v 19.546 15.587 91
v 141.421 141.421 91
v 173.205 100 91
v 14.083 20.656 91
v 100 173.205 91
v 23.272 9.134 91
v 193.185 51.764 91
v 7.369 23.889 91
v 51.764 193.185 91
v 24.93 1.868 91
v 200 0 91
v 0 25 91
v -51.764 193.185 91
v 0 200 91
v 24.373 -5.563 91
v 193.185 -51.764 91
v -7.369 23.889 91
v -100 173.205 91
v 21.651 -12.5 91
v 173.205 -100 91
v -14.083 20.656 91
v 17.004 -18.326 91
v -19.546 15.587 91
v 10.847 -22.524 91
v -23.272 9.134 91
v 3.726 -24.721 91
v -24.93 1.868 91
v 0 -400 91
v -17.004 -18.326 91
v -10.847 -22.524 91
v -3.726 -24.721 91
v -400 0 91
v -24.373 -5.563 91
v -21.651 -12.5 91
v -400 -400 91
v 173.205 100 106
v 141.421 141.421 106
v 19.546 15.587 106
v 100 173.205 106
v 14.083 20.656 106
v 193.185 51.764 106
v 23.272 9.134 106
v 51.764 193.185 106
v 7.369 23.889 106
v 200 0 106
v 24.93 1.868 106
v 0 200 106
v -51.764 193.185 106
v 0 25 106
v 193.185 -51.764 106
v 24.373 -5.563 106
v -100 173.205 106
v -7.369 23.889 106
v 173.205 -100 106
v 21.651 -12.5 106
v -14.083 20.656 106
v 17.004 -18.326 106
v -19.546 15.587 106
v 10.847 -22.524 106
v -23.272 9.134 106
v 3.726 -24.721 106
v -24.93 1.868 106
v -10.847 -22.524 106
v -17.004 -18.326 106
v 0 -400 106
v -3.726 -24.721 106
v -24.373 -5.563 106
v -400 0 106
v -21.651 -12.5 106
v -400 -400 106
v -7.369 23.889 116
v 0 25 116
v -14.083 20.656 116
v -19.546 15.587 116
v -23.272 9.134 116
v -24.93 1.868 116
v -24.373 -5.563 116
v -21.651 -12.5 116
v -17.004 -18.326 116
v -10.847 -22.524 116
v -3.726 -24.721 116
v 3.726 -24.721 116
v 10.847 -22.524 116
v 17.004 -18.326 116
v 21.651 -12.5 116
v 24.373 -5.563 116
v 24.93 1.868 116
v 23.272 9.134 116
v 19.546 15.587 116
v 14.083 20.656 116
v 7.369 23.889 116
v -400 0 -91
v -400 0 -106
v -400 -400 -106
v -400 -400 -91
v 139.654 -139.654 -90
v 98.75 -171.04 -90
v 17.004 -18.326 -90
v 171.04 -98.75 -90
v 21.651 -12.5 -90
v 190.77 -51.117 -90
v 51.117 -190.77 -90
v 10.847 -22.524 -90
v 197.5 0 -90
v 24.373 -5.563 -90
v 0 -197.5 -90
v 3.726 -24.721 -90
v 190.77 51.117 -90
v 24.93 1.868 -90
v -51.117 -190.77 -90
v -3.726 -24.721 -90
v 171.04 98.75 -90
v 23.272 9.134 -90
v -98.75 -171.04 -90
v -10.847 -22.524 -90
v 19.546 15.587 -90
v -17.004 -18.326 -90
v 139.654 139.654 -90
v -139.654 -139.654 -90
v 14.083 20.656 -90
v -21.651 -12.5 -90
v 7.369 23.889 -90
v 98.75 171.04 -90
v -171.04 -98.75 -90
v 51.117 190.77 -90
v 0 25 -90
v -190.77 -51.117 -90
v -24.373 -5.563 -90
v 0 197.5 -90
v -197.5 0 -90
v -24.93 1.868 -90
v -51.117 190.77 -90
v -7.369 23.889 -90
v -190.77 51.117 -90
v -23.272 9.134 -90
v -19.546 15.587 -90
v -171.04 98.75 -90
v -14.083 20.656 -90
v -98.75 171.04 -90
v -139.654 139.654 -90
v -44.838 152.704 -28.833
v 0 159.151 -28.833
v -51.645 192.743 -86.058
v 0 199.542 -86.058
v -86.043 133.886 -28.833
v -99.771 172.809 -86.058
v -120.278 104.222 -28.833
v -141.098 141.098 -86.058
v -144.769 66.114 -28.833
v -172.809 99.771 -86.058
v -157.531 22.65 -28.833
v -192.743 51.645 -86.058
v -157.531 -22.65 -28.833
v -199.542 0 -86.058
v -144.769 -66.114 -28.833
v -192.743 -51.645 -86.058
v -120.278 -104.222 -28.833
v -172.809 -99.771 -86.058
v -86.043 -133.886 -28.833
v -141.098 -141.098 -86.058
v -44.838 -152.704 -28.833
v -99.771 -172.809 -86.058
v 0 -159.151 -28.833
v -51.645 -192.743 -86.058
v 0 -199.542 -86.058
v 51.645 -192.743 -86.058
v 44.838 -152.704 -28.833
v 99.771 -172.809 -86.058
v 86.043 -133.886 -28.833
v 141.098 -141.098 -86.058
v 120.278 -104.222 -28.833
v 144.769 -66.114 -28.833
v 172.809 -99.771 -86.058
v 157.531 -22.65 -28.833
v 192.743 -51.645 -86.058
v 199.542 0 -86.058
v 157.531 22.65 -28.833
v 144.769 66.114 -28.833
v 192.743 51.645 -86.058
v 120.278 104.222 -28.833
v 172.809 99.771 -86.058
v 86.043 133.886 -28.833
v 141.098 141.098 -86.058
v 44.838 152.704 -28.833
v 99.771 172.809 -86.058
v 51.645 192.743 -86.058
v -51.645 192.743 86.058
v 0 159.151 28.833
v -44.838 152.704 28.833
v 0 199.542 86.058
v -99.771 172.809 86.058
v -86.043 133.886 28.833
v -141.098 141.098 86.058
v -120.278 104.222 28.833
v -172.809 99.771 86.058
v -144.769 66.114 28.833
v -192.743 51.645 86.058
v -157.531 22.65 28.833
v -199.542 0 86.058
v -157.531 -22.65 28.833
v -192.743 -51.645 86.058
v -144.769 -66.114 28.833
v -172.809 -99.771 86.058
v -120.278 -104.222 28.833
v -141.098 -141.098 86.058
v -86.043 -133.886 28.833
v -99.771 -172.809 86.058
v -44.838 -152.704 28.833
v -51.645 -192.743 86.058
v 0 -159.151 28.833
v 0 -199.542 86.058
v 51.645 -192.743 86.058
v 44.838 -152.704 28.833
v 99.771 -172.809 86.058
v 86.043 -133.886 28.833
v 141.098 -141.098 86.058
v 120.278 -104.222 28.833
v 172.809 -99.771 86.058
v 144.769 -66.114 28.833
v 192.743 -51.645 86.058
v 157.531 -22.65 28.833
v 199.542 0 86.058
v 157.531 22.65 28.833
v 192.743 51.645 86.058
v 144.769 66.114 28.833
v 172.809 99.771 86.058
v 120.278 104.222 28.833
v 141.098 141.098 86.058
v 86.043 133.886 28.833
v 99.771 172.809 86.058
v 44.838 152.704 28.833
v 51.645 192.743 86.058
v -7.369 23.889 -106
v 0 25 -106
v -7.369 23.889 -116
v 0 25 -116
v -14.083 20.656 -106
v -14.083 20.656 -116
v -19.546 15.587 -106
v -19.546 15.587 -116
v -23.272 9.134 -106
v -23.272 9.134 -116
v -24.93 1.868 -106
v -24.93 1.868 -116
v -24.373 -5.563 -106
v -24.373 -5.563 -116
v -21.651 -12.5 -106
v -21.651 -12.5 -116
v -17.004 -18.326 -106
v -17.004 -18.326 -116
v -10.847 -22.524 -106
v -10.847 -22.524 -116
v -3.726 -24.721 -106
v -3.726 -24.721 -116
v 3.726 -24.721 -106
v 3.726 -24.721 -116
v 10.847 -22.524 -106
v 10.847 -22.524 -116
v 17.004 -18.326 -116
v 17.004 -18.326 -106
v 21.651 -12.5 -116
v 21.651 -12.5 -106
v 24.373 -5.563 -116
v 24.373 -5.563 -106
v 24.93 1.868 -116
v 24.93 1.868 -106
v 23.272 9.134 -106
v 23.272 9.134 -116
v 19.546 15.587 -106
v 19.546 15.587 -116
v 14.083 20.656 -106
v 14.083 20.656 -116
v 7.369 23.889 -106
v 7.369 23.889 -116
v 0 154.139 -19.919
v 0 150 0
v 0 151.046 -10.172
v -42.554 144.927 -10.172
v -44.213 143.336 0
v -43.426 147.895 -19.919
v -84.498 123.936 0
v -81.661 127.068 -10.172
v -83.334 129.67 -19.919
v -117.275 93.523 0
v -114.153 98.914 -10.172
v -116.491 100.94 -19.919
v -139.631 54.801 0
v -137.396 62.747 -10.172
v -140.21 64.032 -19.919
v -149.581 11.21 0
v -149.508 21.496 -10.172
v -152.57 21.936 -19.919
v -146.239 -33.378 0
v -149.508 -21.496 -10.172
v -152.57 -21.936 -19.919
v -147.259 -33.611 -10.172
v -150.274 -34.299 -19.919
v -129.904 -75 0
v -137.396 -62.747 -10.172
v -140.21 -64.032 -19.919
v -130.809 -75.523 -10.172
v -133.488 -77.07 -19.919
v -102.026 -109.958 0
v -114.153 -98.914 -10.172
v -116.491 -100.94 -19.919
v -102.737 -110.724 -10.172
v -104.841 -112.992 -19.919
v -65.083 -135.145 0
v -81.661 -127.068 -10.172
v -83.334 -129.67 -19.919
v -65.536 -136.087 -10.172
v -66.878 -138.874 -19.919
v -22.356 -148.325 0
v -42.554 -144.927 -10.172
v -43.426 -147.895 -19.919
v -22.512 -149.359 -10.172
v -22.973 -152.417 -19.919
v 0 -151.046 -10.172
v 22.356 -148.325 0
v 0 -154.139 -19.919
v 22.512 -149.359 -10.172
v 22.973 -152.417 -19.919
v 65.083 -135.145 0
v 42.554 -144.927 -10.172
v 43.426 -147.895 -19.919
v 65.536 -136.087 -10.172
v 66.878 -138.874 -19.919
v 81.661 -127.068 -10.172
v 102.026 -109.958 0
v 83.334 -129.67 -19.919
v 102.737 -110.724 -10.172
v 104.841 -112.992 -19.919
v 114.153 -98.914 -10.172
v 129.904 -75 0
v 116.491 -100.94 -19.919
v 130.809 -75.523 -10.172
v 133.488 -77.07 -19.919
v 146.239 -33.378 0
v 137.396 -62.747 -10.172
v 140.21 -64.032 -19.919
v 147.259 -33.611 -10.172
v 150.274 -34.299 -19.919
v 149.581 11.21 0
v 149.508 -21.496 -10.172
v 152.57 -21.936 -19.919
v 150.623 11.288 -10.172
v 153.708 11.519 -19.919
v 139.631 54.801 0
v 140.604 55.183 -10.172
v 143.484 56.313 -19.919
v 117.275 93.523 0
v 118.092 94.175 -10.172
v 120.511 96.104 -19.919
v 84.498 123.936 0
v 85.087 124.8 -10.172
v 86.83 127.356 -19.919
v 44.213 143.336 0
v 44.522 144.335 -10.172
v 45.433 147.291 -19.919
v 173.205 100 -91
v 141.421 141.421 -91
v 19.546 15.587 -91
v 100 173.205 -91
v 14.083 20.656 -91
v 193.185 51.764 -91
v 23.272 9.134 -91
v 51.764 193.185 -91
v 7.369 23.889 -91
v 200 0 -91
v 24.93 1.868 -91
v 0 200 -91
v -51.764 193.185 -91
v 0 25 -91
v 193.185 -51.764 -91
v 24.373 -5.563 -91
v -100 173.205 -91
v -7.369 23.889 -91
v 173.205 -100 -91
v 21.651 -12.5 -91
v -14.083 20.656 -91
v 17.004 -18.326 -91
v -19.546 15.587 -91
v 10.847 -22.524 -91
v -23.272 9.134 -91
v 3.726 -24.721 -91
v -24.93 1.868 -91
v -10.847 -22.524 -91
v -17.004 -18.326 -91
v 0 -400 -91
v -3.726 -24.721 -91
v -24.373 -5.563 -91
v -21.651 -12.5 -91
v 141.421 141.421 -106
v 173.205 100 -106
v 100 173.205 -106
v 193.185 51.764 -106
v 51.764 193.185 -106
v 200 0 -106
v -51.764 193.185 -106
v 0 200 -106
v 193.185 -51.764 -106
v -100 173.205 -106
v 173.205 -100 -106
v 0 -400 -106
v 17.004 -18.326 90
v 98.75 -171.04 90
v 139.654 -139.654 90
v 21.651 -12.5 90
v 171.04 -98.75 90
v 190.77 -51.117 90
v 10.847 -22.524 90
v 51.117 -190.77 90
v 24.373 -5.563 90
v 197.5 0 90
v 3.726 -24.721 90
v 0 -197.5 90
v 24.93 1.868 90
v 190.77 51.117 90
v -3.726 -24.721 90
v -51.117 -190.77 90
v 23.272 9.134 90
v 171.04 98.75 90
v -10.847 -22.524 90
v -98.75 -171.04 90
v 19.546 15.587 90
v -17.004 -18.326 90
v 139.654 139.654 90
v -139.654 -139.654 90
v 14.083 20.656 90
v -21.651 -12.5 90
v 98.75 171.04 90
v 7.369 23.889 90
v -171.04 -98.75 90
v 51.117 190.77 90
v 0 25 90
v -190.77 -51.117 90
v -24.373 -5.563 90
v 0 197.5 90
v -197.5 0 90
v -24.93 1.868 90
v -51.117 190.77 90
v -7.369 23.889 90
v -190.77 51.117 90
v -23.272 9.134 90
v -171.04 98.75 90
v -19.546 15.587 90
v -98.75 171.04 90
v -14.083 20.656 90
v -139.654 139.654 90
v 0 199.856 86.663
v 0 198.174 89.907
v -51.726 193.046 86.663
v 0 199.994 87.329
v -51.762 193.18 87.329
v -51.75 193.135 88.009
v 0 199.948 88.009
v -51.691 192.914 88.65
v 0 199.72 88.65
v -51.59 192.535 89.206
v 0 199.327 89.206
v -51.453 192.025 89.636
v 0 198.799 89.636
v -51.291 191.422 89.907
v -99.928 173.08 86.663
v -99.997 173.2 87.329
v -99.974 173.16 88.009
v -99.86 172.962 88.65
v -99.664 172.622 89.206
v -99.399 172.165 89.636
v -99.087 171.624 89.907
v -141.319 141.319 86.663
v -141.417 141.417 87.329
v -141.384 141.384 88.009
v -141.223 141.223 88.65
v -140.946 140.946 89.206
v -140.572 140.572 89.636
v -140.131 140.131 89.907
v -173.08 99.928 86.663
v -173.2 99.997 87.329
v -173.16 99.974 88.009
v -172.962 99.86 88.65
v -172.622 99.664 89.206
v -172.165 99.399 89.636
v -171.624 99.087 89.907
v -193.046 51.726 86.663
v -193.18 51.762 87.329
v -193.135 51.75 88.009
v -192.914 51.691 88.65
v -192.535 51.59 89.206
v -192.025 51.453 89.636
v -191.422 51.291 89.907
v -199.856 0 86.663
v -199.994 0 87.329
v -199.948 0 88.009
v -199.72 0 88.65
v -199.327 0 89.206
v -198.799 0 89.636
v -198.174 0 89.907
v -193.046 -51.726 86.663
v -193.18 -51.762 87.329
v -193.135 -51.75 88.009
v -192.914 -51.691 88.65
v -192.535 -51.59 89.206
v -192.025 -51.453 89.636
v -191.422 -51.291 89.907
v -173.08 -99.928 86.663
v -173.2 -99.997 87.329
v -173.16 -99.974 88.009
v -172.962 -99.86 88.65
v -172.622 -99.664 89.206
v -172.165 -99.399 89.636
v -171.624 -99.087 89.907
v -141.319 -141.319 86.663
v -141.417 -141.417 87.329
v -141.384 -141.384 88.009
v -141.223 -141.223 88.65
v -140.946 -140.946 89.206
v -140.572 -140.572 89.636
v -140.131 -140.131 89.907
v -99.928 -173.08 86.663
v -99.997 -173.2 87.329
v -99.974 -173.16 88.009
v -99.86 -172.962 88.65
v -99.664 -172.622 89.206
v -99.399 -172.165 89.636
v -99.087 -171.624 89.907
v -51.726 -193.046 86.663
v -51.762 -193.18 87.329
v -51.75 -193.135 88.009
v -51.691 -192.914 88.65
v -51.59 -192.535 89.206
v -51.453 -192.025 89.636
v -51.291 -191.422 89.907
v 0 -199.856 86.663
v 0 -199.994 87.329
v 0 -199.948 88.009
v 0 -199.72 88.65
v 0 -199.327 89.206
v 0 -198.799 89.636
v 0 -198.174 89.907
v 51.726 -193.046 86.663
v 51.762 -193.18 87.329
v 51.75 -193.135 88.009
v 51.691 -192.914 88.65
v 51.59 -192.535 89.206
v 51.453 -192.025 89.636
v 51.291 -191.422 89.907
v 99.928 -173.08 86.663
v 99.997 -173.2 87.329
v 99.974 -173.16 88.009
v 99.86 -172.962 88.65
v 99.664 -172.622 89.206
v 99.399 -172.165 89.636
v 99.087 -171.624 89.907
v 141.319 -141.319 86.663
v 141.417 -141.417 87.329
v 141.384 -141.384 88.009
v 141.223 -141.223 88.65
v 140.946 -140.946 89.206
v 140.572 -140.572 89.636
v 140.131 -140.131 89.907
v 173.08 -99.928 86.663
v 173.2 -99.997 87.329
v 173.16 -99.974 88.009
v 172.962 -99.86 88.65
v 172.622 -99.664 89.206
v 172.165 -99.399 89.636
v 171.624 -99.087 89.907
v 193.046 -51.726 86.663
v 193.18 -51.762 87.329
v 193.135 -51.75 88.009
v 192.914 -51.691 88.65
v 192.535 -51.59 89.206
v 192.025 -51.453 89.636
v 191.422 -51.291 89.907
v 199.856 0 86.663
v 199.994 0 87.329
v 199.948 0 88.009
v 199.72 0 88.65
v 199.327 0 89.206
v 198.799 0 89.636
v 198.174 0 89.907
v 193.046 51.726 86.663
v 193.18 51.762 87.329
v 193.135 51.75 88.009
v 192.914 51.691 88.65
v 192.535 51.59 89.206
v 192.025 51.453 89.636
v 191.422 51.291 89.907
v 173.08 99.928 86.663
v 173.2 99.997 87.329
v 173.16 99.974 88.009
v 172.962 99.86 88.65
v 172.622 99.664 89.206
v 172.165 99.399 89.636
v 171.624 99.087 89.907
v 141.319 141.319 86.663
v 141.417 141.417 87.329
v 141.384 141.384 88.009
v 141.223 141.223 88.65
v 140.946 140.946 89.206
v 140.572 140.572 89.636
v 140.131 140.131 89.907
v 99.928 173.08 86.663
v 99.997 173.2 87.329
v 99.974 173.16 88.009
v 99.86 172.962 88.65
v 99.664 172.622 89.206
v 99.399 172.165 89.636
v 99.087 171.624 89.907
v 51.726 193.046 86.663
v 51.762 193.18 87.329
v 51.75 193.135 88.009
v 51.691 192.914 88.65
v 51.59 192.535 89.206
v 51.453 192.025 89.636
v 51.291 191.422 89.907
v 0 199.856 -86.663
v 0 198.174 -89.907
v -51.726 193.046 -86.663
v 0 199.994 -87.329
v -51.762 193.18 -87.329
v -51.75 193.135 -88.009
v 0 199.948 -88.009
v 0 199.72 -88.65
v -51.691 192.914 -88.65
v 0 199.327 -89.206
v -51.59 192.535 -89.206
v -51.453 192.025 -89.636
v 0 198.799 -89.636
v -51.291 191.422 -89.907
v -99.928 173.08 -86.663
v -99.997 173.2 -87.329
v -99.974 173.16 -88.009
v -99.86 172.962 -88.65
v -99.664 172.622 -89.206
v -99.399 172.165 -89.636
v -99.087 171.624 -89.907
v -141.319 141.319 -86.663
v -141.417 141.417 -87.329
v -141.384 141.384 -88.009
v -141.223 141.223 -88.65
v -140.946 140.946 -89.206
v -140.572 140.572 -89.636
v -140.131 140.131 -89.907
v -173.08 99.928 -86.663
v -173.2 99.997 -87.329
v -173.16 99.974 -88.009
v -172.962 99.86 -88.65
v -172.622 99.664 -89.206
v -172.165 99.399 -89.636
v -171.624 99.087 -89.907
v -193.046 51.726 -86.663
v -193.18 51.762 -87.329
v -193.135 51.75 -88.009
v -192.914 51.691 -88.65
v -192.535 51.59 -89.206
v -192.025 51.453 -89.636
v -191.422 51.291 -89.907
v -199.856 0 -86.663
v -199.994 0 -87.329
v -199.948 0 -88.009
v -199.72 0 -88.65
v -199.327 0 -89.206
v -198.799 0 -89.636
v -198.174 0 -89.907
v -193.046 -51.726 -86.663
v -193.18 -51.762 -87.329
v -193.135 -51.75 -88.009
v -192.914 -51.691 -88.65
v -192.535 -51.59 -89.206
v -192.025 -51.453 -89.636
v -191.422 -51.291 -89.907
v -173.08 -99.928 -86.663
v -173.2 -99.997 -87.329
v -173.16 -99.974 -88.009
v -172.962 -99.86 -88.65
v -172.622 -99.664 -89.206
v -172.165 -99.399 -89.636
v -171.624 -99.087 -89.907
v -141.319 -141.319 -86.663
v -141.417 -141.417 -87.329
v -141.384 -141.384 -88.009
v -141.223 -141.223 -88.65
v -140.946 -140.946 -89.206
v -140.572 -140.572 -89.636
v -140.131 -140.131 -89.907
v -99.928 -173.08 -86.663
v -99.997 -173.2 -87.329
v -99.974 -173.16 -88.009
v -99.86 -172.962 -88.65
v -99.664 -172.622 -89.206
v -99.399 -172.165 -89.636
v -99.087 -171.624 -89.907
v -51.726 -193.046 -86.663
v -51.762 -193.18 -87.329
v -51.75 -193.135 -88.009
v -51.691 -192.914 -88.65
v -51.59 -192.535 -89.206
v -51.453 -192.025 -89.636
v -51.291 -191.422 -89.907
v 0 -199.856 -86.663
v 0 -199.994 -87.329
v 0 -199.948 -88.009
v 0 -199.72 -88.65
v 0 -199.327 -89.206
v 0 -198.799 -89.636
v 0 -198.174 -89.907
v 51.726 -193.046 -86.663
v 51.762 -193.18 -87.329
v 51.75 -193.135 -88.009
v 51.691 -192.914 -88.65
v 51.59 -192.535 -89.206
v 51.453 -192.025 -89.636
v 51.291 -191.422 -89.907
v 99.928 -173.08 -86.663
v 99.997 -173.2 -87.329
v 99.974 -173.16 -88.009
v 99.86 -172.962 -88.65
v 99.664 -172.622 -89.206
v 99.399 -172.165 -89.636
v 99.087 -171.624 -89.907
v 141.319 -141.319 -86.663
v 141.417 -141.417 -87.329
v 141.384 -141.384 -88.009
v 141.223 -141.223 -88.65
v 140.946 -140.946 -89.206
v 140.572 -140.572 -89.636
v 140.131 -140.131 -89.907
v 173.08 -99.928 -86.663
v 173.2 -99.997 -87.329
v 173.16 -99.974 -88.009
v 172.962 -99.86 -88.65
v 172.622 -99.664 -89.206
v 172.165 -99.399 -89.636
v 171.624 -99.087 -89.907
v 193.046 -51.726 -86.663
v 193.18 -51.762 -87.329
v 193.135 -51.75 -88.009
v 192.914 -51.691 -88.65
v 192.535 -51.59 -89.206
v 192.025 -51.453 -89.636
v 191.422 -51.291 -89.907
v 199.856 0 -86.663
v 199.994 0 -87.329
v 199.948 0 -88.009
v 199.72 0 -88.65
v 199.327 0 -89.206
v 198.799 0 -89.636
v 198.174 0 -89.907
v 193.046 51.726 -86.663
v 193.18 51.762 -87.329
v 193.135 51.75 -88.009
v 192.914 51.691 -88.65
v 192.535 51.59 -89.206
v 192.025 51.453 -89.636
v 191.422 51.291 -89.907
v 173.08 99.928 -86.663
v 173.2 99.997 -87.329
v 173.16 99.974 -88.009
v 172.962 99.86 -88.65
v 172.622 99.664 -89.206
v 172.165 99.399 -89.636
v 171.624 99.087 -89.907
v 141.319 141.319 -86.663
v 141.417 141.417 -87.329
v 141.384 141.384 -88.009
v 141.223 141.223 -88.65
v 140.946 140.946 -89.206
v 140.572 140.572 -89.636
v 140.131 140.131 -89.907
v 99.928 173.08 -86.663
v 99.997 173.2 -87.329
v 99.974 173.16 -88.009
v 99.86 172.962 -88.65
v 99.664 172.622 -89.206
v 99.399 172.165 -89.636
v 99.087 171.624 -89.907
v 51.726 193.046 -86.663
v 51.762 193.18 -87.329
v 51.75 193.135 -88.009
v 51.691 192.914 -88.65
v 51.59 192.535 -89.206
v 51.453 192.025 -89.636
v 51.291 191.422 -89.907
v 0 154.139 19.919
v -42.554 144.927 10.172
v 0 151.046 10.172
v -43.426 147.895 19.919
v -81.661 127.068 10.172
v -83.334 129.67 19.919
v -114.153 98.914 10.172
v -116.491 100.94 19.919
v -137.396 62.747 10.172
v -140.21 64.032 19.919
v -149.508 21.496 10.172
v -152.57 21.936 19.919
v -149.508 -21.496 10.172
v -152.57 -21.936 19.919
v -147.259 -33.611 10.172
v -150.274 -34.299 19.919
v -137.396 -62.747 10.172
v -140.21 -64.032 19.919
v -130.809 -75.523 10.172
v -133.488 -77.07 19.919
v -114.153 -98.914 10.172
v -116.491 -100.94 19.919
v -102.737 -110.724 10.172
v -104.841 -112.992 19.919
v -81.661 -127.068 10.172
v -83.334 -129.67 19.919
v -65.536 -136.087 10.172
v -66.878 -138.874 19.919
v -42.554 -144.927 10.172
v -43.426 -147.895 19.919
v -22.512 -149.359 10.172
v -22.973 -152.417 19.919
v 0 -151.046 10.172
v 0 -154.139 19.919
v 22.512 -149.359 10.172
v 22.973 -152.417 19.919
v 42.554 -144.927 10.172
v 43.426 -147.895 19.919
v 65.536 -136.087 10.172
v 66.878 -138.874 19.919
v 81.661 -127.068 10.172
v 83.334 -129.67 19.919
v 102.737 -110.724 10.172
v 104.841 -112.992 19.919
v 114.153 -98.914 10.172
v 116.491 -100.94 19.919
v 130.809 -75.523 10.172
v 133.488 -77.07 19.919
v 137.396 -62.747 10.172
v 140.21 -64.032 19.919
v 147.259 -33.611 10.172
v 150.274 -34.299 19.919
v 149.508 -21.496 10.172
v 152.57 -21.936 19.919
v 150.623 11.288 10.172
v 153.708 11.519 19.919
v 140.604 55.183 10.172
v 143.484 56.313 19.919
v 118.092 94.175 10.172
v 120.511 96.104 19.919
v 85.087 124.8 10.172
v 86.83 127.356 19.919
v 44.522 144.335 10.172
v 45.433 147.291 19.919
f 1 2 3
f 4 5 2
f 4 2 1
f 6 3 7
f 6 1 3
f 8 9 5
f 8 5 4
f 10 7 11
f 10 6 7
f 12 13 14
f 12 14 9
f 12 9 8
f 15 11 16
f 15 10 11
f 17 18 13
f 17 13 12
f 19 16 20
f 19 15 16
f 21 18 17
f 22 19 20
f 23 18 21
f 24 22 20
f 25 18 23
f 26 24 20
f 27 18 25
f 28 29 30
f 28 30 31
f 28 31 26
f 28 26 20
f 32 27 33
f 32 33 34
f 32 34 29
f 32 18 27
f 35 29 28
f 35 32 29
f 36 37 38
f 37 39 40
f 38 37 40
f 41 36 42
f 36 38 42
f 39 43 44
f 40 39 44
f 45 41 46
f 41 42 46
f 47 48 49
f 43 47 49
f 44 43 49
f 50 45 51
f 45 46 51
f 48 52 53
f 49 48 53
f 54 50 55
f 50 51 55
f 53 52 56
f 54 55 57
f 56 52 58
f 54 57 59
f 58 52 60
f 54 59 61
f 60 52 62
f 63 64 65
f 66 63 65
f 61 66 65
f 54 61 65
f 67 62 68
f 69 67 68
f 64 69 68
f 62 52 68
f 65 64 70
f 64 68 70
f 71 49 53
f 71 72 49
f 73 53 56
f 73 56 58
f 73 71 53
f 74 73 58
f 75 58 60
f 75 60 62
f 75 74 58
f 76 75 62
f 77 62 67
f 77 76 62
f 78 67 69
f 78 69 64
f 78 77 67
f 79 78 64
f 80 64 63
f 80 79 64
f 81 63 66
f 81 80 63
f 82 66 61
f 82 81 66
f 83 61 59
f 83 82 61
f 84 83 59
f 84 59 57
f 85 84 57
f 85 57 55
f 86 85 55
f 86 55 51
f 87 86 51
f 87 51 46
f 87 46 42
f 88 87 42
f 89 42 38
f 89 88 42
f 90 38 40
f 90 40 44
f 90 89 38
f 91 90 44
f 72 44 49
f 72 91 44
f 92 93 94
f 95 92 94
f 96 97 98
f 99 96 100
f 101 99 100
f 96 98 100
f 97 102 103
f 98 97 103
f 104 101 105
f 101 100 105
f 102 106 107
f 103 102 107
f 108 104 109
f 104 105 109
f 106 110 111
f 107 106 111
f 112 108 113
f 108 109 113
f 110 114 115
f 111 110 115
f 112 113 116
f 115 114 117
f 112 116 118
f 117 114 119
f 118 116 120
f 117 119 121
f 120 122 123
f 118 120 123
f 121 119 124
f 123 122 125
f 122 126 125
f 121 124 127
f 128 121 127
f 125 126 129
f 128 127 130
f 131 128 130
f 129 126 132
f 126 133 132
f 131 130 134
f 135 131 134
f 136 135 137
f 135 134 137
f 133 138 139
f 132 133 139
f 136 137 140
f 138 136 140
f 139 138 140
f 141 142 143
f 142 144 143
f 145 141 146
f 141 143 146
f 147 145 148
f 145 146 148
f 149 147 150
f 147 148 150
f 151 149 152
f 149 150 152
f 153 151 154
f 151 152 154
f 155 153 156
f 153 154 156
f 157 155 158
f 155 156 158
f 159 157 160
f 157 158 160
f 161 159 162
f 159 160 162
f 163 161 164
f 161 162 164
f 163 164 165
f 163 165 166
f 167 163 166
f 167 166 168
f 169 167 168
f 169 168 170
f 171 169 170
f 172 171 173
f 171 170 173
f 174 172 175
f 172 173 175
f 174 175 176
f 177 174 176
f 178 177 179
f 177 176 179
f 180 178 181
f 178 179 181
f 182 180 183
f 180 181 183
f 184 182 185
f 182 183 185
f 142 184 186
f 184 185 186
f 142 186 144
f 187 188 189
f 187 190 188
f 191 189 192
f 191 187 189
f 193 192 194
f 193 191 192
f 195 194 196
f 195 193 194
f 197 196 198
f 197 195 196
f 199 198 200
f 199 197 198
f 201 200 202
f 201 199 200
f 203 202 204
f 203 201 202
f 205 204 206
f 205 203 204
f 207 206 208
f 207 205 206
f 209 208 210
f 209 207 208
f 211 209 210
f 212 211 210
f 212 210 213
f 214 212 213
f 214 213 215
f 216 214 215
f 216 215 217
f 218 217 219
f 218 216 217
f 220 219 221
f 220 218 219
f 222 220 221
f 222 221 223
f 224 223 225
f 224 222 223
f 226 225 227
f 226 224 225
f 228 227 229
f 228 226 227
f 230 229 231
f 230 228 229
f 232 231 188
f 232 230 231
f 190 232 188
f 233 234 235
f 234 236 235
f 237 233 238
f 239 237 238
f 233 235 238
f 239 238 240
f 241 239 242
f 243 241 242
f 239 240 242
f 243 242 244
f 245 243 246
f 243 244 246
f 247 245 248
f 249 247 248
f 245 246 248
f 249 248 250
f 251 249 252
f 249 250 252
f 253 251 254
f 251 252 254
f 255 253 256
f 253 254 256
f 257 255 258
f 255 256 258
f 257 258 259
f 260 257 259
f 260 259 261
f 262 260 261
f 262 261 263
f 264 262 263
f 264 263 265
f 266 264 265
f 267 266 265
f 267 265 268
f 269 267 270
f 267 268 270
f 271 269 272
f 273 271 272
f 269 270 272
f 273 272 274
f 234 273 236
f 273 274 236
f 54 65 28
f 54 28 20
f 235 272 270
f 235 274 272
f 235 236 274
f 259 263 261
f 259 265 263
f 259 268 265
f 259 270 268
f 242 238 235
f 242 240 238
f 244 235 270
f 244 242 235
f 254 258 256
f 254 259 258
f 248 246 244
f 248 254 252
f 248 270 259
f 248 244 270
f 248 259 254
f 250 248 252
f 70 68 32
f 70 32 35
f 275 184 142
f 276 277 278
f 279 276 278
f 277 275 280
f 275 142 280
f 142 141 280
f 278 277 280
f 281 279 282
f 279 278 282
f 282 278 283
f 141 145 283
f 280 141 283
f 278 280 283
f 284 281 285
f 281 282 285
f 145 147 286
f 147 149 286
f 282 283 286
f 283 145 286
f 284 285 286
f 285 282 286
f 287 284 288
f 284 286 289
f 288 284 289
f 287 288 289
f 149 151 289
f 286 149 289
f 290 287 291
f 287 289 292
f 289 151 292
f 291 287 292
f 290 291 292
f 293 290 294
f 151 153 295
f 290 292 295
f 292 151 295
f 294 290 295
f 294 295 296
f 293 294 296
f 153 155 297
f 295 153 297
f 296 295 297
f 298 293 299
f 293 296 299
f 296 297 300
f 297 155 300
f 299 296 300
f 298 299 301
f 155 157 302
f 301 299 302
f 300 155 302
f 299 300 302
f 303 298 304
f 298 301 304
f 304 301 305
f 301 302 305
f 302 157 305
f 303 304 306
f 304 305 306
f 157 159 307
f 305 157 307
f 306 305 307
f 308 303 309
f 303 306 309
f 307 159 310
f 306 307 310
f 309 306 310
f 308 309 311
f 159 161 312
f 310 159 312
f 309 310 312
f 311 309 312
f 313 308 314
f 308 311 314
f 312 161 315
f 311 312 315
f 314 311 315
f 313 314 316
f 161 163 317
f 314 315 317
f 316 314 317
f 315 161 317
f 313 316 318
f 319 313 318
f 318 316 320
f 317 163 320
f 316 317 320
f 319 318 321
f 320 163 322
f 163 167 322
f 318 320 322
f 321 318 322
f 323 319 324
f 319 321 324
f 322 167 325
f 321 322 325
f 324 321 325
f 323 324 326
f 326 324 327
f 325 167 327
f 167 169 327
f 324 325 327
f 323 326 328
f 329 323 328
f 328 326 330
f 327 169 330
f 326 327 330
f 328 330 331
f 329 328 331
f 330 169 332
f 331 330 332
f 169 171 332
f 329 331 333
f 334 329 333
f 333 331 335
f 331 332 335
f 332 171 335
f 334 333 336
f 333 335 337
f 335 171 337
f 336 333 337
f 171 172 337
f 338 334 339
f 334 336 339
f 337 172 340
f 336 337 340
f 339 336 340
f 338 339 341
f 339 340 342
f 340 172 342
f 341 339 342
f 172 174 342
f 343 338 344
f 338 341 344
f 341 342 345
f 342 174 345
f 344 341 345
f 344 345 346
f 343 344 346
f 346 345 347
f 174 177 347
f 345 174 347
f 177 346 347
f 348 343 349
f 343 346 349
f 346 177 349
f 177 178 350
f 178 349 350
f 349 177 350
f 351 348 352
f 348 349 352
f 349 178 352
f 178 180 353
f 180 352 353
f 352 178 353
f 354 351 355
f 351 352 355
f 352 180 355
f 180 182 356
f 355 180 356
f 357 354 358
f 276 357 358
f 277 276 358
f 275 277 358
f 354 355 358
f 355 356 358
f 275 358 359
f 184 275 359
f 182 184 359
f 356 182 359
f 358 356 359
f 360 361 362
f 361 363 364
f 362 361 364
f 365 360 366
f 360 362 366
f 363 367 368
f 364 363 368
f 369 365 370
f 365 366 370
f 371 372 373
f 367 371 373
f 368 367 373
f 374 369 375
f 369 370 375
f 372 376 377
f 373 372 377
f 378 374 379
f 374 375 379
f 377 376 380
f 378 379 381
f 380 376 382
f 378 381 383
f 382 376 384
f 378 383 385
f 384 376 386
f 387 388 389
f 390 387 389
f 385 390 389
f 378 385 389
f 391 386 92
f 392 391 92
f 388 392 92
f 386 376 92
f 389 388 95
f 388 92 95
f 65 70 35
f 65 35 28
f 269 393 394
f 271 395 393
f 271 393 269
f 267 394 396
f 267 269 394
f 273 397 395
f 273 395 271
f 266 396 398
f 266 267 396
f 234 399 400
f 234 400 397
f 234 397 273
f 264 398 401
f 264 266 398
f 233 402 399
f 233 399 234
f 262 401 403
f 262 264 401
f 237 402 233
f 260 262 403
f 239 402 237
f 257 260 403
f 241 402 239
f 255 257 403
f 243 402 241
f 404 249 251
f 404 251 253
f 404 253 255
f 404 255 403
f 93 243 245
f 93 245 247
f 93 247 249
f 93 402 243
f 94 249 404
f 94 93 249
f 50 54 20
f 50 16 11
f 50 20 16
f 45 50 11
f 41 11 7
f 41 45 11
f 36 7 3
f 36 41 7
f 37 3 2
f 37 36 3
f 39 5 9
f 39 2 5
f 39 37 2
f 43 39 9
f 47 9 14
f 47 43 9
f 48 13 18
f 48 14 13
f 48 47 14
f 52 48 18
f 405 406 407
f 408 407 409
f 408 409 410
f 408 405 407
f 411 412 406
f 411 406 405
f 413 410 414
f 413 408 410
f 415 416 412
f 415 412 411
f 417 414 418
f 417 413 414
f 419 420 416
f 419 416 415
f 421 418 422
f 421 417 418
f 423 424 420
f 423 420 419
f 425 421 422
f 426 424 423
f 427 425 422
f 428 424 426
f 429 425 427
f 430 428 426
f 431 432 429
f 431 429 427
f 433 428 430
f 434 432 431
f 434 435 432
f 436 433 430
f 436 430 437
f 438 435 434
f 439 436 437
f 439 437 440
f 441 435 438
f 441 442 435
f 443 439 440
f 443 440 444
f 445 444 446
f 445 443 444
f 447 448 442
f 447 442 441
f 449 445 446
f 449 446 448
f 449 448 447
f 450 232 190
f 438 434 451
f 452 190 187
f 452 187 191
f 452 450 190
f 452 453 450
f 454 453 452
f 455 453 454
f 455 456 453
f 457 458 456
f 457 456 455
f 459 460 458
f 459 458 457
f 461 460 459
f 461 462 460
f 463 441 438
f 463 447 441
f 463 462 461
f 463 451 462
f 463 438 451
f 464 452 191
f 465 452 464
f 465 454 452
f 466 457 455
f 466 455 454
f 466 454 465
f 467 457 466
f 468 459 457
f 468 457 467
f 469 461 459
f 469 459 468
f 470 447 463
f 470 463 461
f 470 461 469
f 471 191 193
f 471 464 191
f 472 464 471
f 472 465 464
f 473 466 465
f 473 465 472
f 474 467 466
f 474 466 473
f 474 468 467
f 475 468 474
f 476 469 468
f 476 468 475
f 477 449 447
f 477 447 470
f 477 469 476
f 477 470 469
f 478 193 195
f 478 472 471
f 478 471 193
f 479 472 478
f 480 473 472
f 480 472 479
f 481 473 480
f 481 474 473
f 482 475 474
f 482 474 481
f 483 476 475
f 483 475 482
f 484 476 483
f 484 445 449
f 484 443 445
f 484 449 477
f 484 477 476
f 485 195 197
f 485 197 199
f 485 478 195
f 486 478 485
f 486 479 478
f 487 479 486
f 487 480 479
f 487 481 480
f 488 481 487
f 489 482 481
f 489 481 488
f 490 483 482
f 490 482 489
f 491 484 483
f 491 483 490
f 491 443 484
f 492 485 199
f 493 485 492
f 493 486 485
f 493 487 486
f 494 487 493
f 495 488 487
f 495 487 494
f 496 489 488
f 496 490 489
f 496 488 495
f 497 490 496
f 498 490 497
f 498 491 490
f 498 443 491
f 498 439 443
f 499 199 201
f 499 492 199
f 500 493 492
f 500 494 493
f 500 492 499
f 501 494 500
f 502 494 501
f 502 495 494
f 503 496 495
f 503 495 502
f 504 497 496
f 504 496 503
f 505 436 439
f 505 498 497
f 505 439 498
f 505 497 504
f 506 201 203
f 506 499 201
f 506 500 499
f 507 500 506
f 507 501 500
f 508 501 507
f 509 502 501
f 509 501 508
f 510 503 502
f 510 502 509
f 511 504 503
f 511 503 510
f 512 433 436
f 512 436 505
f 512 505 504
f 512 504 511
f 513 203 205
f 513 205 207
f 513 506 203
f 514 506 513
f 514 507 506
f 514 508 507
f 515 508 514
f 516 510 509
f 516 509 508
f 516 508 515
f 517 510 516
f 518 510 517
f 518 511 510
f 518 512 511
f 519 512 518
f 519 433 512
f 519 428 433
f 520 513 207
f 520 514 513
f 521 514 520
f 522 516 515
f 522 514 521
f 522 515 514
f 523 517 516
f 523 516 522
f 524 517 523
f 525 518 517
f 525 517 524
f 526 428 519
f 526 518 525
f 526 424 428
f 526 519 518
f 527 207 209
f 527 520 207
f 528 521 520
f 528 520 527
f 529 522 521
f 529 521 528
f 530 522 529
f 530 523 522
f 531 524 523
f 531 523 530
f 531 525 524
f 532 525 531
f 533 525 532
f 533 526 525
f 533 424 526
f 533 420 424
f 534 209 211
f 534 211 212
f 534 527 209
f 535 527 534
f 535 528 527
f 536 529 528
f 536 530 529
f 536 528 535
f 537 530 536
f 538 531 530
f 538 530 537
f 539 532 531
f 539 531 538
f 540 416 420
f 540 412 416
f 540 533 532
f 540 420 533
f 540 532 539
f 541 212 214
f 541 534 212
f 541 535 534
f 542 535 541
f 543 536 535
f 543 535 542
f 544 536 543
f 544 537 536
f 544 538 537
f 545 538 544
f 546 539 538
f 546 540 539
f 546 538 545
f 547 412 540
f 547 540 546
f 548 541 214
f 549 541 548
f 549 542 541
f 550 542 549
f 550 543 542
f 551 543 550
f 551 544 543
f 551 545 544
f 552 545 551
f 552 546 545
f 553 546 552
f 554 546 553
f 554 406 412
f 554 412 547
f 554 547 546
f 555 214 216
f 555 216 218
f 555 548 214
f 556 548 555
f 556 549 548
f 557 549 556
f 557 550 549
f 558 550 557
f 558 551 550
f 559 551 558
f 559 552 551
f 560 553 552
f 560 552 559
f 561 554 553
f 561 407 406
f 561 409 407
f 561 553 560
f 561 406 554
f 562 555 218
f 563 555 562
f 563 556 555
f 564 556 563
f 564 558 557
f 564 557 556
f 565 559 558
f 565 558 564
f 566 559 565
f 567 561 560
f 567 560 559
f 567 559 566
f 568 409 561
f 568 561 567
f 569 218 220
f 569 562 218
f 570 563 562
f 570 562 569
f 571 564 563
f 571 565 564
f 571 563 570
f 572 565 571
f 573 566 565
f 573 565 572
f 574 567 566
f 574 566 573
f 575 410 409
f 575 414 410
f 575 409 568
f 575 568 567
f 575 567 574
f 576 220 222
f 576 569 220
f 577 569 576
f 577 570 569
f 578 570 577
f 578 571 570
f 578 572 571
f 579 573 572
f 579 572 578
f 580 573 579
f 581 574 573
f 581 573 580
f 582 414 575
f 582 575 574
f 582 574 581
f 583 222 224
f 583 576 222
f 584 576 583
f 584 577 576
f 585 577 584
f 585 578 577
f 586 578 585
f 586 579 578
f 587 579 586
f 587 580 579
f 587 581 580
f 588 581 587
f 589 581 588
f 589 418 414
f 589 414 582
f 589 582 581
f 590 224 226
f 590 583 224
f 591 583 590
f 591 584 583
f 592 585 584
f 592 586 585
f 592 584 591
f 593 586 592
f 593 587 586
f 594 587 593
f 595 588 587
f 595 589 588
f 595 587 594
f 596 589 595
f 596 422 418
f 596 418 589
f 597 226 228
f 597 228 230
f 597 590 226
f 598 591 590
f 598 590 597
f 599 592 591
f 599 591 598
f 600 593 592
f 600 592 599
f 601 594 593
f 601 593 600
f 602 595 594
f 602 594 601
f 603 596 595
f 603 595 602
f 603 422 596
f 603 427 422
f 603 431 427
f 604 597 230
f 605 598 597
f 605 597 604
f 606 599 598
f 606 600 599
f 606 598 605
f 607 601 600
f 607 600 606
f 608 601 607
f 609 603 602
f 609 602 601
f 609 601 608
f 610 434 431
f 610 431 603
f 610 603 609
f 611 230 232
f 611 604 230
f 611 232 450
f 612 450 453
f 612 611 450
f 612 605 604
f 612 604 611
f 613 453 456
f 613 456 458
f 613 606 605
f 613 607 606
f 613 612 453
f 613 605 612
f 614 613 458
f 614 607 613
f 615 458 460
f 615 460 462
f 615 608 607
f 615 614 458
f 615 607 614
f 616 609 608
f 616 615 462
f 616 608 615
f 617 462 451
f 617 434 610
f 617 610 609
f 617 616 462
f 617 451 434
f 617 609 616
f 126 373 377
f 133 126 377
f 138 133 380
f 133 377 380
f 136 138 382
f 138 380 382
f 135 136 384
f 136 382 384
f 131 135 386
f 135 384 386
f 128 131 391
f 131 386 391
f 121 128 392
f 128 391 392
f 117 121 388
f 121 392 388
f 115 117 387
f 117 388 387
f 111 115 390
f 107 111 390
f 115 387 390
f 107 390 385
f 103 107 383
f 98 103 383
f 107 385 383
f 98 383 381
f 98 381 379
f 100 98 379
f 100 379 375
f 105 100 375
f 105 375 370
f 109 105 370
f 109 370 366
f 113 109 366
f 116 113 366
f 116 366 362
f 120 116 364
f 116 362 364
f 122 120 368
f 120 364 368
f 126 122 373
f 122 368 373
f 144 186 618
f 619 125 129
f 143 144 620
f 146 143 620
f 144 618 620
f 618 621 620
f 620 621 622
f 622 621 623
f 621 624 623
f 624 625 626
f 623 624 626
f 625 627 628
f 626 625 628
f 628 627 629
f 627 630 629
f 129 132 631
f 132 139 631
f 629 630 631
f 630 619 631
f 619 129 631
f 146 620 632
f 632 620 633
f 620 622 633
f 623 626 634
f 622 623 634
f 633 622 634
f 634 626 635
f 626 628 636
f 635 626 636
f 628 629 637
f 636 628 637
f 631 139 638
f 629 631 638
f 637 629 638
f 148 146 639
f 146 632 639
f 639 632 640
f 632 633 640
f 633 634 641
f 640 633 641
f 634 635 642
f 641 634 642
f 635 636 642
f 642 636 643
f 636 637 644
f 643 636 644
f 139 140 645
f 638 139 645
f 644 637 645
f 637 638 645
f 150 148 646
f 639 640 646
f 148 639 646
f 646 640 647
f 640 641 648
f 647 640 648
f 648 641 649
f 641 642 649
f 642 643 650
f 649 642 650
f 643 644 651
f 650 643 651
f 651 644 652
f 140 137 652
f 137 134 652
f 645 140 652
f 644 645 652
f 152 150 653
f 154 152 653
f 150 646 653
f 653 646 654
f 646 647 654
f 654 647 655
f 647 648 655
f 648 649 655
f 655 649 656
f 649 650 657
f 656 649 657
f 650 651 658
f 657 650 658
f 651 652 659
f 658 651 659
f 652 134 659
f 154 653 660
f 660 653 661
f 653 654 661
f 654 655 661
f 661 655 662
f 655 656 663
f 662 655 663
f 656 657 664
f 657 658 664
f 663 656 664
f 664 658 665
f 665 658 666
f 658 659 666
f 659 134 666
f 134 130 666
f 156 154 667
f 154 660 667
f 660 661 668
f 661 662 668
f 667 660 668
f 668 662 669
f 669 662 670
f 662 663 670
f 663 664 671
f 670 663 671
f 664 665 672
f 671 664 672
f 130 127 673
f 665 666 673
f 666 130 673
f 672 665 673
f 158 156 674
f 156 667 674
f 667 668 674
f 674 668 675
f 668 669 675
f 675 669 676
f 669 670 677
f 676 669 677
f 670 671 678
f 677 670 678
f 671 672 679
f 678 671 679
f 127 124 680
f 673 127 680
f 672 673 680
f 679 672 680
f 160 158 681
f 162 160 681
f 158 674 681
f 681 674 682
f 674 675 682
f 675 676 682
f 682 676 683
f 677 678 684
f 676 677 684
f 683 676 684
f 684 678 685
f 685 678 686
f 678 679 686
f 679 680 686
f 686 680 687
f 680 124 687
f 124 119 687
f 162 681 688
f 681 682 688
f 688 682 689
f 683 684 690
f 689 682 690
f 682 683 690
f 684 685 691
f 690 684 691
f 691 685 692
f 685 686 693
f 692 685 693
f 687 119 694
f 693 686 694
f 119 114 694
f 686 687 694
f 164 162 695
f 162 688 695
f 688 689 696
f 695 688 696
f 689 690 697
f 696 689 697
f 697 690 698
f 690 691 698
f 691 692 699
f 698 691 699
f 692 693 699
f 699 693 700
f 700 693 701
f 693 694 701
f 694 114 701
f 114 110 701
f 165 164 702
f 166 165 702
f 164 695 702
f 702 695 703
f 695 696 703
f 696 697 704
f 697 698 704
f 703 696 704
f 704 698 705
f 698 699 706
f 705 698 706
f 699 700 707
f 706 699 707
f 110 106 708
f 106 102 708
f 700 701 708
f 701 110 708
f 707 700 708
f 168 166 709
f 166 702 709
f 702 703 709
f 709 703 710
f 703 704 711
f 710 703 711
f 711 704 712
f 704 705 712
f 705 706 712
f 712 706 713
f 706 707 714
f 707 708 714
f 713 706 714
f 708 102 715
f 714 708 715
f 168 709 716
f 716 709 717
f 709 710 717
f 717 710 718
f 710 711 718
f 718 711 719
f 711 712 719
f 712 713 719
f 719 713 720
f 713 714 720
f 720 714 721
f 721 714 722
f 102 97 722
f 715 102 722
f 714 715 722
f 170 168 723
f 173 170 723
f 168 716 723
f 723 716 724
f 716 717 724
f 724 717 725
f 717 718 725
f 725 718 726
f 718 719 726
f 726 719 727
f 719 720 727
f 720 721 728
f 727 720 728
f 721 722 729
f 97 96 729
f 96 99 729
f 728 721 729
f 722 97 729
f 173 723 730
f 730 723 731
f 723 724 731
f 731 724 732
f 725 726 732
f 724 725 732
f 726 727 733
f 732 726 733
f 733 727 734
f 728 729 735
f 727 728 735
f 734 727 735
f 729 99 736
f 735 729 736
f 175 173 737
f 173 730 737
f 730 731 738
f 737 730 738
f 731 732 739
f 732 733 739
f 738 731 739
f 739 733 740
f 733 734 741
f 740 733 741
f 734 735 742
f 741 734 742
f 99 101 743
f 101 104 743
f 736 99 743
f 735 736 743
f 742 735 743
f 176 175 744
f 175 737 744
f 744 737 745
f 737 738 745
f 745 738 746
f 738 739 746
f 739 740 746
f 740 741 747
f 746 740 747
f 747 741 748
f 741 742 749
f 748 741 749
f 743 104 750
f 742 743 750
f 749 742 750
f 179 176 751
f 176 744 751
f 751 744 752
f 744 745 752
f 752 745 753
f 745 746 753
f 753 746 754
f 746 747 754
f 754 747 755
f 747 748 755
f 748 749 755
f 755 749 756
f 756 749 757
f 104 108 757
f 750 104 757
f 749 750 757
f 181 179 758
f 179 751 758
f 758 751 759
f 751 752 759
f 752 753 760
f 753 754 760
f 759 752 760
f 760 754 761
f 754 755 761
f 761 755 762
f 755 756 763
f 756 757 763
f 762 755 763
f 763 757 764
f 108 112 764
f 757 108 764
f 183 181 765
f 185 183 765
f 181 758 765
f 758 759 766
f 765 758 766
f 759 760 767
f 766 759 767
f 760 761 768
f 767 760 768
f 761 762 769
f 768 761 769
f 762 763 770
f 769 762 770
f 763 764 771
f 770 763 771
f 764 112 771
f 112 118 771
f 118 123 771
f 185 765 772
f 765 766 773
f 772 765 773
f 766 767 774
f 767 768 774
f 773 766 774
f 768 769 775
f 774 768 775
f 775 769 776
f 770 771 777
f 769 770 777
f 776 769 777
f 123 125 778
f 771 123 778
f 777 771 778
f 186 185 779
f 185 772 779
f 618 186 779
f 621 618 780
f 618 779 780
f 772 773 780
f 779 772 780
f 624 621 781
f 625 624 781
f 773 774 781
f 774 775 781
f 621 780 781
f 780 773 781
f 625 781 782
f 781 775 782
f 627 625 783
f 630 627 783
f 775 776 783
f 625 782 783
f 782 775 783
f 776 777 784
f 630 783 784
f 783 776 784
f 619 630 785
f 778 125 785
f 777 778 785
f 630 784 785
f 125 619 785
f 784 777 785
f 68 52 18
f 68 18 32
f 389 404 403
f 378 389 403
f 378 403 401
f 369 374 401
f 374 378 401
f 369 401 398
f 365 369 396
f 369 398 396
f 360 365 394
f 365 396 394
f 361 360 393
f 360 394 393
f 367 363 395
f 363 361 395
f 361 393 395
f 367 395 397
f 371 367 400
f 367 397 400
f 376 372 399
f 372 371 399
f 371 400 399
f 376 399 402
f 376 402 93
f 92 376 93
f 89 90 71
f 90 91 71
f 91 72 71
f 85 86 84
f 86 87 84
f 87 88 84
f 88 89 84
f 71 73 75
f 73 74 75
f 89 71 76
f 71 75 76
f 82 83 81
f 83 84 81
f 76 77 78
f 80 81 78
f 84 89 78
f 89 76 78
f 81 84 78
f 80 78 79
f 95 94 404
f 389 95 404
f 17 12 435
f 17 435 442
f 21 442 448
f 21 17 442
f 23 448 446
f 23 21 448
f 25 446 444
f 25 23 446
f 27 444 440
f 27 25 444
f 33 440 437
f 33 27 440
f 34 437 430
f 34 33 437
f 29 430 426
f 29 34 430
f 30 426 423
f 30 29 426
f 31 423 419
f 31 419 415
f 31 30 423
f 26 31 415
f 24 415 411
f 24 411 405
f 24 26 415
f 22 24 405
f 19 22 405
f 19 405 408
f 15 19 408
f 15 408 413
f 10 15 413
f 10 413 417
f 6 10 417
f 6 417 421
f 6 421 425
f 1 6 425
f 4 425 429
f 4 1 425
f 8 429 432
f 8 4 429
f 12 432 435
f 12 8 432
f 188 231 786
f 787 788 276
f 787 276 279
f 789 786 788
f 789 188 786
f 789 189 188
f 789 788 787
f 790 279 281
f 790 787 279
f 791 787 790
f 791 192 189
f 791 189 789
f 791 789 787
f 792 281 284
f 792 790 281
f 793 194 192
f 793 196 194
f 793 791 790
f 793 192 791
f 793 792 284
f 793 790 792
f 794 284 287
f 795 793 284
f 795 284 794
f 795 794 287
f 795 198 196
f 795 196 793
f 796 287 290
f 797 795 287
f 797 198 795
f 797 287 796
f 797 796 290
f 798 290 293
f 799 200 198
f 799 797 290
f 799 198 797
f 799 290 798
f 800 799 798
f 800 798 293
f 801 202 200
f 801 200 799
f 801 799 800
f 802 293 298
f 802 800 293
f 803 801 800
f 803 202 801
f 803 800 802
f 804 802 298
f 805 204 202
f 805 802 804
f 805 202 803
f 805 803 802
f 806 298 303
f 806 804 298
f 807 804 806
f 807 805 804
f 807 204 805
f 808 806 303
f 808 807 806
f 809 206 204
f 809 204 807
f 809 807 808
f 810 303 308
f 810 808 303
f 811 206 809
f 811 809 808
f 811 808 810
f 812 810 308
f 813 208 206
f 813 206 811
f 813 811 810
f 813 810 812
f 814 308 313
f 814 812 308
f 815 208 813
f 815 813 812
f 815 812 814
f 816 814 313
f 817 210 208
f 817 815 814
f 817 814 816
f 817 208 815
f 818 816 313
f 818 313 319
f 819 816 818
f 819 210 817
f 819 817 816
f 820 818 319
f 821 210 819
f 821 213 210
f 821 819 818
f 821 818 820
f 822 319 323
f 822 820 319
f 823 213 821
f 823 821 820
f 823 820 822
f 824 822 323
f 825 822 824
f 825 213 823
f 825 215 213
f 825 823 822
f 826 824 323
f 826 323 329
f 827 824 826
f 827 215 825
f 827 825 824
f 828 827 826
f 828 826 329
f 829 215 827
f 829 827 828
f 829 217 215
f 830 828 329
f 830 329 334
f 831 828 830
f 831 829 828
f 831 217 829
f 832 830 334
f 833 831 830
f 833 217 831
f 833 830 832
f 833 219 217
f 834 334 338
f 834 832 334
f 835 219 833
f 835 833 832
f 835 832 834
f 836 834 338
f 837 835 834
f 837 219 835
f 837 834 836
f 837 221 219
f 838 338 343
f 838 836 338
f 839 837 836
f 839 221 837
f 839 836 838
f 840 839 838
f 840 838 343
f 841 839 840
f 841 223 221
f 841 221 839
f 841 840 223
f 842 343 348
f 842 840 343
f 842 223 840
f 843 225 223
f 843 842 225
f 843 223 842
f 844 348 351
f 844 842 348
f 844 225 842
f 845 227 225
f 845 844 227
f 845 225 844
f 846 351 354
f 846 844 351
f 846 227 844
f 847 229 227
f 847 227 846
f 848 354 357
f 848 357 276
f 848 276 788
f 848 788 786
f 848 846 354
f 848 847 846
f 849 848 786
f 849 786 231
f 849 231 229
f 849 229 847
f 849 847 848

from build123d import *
from build123d import SkipClean  # not in build123d's __all__

# Parameters (mm, degrees)
F0_W     = 25
F0_H     = 10
F0_H_2   = 15
F0_W_2   = 175
F5_DEPTH = 15


# Not quite as in the source:
# - ends of sketch curves that miss each other by under 0.0002 mm in the source are joined


with BuildPart() as f1:
    # F0 (on Right) → F1 (revolve)
    with BuildSketch(Plane.YZ):
        with Locations((12.5, 111)):
            Rectangle(F0_W, F0_H)
        with Locations((12.5, 98.5)):
            Rectangle(F0_W, F0_H_2)
        Polygon((0, 0), (25, 0), (25, 90), (25, 91), (0, 91), align=None)
    revolve(axis=Axis((0, 0, 58), (0, 0, 1)))

    # F0 (on Right) → F2 (revolve)
    with BuildSketch(Plane.YZ):
        with BuildLine():
            ThreePointArc((150, 0), (152.3425507406, 15.1250629778), (159.1507012033, 28.8328768565))
            Line((159.1507012033, 28.8328768565), (199.542465, 86.058356))
            ThreePointArc((199.542465, 86.058356), (199.7196970287, 88.6501935058), (197.5, 90))
            Line((197.5, 90), (25, 90))
            Line((25, 90), (25, 0))
            Line((25, 0), (150, 0))
        make_face()
    revolve(axis=Axis((0, 0, 58), (0, 0, 1)))

    # F0 (on Right) → F3 (revolve)
    with BuildSketch(Plane.YZ):
        with Locations((112.5, 98.5)):
            Rectangle(F0_W_2, F0_H_2)
    revolve(axis=Axis((0, 0, 58), (0, 0, 1)))

    # F4 (on face) → F5 (join, through all)
    with BuildSketch(Plane.XY.offset(106)):
        with BuildLine():
            ThreePointArc((0, -200), (-141.4213562373, -141.4213562373), (-200, 0))
            Line((-200, 0), (-400, 0))
            Line((-400, 0), (-400, -400))
            Line((-400, -400), (0, -400))
            Line((0, -400), (0, -200))
        make_face()
        with BuildLine():
            Line((-400, 0), (-200, 0))
            ThreePointArc((-200, 0), (-173.2050807569, 100), (-100, 173.2050807569))
            Line((-100, 173.2050807569), (-400, 0))
        make_face()
        with BuildLine():
            ThreePointArc((173.2050807569, -100), (100, -173.2050807569), (0, -200))
            Line((0, -200), (0, -400))
            Line((0, -400), (173.2050807569, -100))
        make_face()
    extrude(amount=-F5_DEPTH)

    # F6: F1 across face


with BuildPart() as f1_1:
    add(f1.part, clean=False)
    with SkipClean():  # cleaning this boolean's faces spoils the solid; the shape is the same uncleaned
        add(f1.part.mirror(Plane(origin=(0, 0, 0), x_dir=(1, 0, 0), z_dir=(0, 0, -1))), clean=False)


solid = f1_1.part
